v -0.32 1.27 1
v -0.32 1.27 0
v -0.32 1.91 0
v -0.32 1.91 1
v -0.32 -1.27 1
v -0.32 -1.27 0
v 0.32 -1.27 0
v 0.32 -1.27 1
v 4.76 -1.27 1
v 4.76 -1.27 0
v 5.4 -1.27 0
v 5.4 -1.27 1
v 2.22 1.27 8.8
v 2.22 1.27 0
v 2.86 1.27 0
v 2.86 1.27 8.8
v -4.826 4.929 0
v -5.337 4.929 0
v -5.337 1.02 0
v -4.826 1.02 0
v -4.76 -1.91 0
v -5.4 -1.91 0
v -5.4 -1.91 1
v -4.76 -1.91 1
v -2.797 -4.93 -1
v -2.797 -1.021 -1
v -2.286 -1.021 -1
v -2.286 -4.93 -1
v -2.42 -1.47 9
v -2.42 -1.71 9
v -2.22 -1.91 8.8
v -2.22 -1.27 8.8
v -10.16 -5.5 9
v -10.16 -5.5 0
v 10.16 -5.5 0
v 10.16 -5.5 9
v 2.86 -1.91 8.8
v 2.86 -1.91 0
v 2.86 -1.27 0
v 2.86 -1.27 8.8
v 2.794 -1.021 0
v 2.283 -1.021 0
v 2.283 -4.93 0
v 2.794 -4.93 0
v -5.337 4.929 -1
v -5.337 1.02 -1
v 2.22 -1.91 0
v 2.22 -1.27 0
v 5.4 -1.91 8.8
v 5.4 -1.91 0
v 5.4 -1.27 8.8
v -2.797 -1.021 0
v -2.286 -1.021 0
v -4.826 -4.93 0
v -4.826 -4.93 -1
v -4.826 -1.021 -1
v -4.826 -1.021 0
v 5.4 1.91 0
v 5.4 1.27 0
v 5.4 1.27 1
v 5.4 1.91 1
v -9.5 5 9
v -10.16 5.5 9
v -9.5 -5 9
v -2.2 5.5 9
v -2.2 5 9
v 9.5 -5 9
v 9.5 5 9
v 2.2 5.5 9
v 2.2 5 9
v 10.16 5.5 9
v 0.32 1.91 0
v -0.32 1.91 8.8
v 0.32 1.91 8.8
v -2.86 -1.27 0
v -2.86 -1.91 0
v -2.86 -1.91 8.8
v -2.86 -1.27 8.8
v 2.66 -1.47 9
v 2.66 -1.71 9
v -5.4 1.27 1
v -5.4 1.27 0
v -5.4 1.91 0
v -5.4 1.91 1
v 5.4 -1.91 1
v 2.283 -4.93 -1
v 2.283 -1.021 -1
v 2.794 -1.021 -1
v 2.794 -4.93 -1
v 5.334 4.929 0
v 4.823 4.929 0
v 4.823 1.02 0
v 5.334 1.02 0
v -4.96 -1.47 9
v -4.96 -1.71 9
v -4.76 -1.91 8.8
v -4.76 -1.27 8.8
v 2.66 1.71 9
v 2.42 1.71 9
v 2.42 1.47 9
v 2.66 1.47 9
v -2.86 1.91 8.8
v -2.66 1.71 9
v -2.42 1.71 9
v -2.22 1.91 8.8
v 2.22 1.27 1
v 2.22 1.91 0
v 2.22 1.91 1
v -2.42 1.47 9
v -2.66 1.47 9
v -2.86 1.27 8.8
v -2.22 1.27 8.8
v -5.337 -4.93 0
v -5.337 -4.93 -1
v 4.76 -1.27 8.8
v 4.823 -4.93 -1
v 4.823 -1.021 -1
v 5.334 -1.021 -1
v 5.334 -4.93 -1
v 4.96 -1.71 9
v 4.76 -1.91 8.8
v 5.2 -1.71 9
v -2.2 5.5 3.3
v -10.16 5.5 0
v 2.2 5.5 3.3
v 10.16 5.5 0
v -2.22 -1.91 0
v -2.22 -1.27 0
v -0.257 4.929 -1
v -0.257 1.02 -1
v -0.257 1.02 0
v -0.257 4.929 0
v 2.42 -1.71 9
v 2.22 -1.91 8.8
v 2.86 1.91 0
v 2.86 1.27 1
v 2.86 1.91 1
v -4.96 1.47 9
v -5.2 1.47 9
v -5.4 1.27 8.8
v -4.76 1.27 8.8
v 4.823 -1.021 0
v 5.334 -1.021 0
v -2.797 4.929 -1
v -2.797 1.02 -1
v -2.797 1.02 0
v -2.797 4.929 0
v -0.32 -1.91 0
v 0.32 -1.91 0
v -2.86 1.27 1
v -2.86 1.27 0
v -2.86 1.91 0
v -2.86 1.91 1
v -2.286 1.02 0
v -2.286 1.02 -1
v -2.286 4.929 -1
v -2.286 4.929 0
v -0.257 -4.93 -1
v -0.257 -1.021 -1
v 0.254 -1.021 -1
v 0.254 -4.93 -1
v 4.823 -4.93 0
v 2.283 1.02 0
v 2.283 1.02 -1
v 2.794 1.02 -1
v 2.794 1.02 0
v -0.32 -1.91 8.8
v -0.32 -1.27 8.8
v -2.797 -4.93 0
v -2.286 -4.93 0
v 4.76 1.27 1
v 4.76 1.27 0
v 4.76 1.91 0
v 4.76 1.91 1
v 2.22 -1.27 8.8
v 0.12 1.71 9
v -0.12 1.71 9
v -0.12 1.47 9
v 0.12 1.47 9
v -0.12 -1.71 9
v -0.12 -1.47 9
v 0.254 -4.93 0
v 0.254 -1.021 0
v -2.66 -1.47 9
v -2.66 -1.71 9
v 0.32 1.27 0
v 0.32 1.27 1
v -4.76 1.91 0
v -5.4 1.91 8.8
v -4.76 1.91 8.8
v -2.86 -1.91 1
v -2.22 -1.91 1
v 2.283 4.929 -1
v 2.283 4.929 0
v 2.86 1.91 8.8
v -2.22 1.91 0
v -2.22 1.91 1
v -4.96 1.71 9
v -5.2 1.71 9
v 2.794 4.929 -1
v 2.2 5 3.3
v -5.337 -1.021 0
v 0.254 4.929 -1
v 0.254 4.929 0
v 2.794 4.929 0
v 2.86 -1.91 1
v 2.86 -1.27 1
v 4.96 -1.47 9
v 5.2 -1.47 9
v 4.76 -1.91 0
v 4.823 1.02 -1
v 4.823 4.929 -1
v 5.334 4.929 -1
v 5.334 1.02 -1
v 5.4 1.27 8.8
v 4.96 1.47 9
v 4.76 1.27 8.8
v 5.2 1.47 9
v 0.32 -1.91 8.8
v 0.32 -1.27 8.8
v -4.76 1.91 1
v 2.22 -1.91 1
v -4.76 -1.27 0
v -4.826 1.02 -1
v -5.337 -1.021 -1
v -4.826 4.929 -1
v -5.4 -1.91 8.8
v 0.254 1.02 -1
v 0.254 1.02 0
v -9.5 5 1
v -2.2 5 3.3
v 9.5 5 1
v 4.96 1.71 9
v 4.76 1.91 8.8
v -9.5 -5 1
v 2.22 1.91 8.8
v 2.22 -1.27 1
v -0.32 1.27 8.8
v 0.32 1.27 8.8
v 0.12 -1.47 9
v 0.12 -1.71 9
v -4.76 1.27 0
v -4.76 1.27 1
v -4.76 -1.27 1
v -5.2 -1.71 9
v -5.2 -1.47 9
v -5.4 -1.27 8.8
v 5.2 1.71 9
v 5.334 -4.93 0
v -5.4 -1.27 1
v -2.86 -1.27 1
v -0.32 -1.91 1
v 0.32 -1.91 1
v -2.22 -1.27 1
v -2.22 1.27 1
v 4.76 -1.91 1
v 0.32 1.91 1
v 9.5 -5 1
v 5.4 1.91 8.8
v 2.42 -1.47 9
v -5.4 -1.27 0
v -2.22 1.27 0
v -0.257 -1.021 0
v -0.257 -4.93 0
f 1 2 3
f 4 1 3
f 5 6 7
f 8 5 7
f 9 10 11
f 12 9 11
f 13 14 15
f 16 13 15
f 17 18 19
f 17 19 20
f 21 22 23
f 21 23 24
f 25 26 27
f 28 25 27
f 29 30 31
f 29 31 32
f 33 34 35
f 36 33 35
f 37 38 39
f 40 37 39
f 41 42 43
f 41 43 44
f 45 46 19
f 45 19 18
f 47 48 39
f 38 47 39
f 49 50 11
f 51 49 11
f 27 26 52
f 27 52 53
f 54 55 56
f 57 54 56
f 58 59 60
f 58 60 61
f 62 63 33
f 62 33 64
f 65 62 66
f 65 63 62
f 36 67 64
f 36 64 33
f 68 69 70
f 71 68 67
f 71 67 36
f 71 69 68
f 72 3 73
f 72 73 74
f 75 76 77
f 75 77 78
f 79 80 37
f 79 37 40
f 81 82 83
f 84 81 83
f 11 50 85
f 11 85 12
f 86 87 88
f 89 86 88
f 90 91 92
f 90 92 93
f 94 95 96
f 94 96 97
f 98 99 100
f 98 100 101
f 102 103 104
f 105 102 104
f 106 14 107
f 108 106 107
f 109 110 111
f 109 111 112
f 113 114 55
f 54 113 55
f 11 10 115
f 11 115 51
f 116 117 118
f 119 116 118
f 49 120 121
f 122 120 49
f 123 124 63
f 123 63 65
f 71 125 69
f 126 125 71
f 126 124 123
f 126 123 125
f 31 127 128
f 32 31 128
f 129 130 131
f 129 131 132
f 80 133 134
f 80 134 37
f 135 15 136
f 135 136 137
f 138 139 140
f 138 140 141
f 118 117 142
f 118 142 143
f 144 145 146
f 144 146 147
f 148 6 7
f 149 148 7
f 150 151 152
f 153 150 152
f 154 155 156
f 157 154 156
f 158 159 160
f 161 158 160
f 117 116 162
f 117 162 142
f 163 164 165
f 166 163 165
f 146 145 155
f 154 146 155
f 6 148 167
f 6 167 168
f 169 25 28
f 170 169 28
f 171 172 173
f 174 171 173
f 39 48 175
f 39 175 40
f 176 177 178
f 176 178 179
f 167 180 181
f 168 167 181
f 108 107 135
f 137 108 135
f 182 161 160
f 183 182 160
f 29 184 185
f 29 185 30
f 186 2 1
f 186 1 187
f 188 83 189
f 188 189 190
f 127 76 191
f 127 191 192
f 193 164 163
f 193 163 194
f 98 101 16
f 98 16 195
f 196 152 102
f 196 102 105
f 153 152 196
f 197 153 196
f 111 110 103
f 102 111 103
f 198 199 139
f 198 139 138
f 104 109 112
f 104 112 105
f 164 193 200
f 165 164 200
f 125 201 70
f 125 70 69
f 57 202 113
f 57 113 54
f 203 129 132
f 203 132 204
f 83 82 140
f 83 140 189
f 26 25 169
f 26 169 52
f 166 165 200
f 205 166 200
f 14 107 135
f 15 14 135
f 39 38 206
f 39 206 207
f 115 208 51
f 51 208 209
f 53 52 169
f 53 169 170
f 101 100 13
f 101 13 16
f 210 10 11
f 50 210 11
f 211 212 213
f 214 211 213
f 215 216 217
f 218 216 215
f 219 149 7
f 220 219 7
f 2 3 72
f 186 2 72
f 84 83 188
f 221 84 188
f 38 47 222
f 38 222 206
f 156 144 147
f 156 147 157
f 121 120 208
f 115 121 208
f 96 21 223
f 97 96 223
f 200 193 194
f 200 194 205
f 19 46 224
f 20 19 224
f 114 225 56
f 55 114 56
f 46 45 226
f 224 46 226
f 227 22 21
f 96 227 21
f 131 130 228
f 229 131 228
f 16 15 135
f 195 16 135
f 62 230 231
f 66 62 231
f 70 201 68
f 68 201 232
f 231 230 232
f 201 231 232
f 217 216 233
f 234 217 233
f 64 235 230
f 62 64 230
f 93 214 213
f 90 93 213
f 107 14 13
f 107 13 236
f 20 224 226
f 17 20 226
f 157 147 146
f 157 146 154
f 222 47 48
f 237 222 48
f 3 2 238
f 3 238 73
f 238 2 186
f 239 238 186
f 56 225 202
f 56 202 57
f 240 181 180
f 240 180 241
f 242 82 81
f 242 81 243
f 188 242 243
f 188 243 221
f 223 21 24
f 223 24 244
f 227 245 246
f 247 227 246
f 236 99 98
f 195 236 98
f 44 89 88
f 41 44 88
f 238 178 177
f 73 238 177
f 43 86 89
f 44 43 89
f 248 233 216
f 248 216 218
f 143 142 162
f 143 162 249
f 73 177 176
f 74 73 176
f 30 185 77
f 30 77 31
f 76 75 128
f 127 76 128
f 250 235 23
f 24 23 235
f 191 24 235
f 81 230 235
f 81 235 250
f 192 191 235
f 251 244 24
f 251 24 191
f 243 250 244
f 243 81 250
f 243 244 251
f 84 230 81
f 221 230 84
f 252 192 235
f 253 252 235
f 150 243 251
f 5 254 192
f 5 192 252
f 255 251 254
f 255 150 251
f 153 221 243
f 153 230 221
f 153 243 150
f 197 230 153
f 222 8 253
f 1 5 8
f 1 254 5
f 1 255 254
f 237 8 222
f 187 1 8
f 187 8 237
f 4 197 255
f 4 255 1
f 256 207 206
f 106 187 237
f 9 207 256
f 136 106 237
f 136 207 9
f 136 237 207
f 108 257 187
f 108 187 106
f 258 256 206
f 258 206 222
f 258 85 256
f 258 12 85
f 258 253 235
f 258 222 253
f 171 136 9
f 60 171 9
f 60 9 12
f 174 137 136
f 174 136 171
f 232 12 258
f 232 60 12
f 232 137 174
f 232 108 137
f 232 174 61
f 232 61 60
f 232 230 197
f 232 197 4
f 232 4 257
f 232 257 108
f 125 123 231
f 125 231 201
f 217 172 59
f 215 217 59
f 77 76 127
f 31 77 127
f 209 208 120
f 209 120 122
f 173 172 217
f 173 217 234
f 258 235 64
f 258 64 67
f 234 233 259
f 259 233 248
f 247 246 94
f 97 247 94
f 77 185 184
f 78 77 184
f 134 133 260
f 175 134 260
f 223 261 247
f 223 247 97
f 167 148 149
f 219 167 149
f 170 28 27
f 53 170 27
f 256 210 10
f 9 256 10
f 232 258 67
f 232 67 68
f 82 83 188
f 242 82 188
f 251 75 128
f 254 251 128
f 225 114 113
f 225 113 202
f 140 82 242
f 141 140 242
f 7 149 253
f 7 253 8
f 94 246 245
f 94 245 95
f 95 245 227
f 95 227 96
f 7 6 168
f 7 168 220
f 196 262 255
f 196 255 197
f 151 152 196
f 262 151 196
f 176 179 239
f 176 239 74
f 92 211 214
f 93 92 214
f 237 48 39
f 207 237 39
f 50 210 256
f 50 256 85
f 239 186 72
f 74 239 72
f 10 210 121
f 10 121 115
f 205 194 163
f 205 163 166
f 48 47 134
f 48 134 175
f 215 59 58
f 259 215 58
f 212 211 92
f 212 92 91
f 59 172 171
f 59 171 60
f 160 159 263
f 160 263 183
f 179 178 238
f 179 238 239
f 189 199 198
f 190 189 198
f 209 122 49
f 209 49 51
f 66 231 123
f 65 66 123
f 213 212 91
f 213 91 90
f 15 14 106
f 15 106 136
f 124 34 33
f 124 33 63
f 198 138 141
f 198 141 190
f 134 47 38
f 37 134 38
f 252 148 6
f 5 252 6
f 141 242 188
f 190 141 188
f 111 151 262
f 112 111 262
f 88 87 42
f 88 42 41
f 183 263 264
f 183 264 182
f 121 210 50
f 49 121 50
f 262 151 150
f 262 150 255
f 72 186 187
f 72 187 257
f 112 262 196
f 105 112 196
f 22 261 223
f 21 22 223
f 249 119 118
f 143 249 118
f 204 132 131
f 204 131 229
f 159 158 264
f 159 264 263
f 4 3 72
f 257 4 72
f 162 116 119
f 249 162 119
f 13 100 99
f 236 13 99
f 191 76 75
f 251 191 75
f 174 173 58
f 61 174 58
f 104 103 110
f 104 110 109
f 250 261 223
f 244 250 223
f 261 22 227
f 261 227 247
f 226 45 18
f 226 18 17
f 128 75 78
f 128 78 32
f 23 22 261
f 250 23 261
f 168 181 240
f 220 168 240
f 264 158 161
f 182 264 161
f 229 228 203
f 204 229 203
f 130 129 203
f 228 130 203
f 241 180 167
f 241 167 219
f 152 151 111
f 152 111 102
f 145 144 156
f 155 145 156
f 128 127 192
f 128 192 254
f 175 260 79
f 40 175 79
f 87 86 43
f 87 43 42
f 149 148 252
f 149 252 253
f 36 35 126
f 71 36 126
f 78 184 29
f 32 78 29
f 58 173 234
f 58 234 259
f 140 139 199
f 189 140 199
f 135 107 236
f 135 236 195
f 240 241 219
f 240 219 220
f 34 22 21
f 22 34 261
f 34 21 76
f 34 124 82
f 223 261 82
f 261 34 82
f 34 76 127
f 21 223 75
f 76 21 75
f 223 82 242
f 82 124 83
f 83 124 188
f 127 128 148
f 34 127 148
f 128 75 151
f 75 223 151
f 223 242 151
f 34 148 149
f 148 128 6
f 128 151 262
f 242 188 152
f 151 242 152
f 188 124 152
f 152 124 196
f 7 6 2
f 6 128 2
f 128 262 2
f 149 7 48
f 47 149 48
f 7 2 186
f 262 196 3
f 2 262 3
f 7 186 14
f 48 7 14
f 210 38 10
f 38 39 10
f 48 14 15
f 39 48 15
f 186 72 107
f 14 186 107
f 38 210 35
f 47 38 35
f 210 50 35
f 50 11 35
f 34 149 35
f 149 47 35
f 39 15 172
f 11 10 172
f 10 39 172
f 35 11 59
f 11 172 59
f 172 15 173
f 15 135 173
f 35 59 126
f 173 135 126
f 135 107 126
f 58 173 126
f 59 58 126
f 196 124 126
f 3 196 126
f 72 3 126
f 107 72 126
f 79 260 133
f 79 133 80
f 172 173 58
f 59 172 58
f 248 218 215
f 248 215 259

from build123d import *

# Parameters (mm, degrees)
F0_W       = 20.32
F0_H       = 11
F0_W_2     = 19
F0_H_2     = 10
F1_DEPTH   = 9
F0_W_3     = 0.64
F0_H_3     = 0.64
F2_DEPTH   = 1
F3_DEPTH   = 9
F4_SIZE    = 0.2
F4_2_SIZE  = 0.2
F4_3_SIZE  = 0.2
F4_4_SIZE  = 0.2
F4_5_SIZE  = 0.2
F4_6_SIZE  = 0.2
F6_W       = 4.4
F6_H       = 0.5
F7_DEPTH   = 5.7
F9_W       = 0.5111949686
F9_H       = 3.9092235888
F10_DEPTH  = 1
F11_DEPTH  = 9
F12_SIZE   = 0.2
F12_2_SIZE = 0.2
F12_3_SIZE = 0.2
F12_4_SIZE = 0.2


# Not quite as in the source:
# - a feature names something its author has since deleted; it is built from what else it names


with BuildPart() as f1:
    # F0 (on Top) → F1 (new body)
    with BuildSketch(Plane.XY):
        Rectangle(F0_W, F0_H)
        Rectangle(F0_W_2, F0_H_2, mode=Mode.SUBTRACT)
    extrude(amount=F1_DEPTH)

    # F0 (on Top) → F2 (join)
    with BuildSketch(Plane.XY):
        Rectangle(F0_W_2, F0_H_2)
        with Locations((-5.08, -1.59)):
            Rectangle(F0_W_3, F0_H_3, mode=Mode.SUBTRACT)
        with Locations((-2.54, -1.59)):
            Rectangle(F0_W_3, F0_H_3, mode=Mode.SUBTRACT)
        with Locations((0, -1.59)):
            Rectangle(F0_W_3, F0_H_3, mode=Mode.SUBTRACT)
        with Locations((2.54, -1.59)):
            Rectangle(F0_W_3, F0_H_3, mode=Mode.SUBTRACT)
        with Locations((5.08, -1.59)):
            Rectangle(F0_W_3, F0_H_3, mode=Mode.SUBTRACT)
        with Locations((-5.08, 1.59)):
            Rectangle(F0_W_3, F0_H_3, mode=Mode.SUBTRACT)
        with Locations((-2.54, 1.59)):
            Rectangle(F0_W_3, F0_H_3, mode=Mode.SUBTRACT)
        with Locations((0, 1.59)):
            Rectangle(F0_W_3, F0_H_3, mode=Mode.SUBTRACT)
        with Locations((2.54, 1.59)):
            Rectangle(F0_W_3, F0_H_3, mode=Mode.SUBTRACT)
        with Locations((5.08, 1.59)):
            Rectangle(F0_W_3, F0_H_3, mode=Mode.SUBTRACT)
    extrude(amount=F2_DEPTH)

    # F6 (on offset) → F7 (cut)
    with BuildSketch(Plane.XY.offset(3.3)):
        with Locations((0, 5.25)):
            Rectangle(F6_W, F6_H)
    extrude(amount=F7_DEPTH, mode=Mode.SUBTRACT)


with BuildPart() as f3:
    # F0 (on Top) → F3 (new body)
    with BuildSketch(Plane.XY):
        with Locations((0, -1.59)):
            Rectangle(F0_W_3, F0_H_3)
    extrude(amount=F3_DEPTH)

    # F4#2
    f4_2_edges = [f3.edges().sort_by_distance(p)[0] for p in [
        (0, -1.27, 9),
        (-0.32, -1.59, 9),
        (0, -1.91, 9),
        (0.32, -1.59, 9),
    ]]
    chamfer(f4_2_edges, length=F4_2_SIZE)


with BuildPart() as f3b:
    # F0 (on Top) → F3, piece 2 (new body)
    with BuildSketch(Plane.XY):
        with Locations((0, 1.59)):
            Rectangle(F0_W_3, F0_H_3)
    extrude(amount=F3_DEPTH)

    # F4
    f4_edges = [f3b.edges().sort_by_distance(p)[0] for p in [
        (-0.32, 1.59, 9),
        (0, 1.27, 9),
        (0.32, 1.59, 9),
        (0, 1.91, 9),
    ]]
    chamfer(f4_edges, length=F4_SIZE)


with BuildPart() as f3c:
    # F0 (on Top) → F3, piece 3 (new body)
    with BuildSketch(Plane.XY):
        with Locations((2.54, 1.59)):
            Rectangle(F0_W_3, F0_H_3)
    extrude(amount=F3_DEPTH)

    # F4#4
    f4_4_edges = [f3c.edges().sort_by_distance(p)[0] for p in [
        (2.22, 1.59, 9),
        (2.54, 1.27, 9),
        (2.86, 1.59, 9),
        (2.54, 1.91, 9),
    ]]
    chamfer(f4_4_edges, length=F4_4_SIZE)


with BuildPart() as f3d:
    # F0 (on Top) → F3, piece 4 (new body)
    with BuildSketch(Plane.XY):
        with Locations((2.54, -1.59)):
            Rectangle(F0_W_3, F0_H_3)
    extrude(amount=F3_DEPTH)

    # F4#3
    f4_3_edges = [f3d.edges().sort_by_distance(p)[0] for p in [
        (2.22, -1.59, 9),
        (2.54, -1.91, 9),
        (2.86, -1.59, 9),
        (2.54, -1.27, 9),
    ]]
    chamfer(f4_3_edges, length=F4_3_SIZE)


with BuildPart() as f3e:
    # F0 (on Top) → F3, piece 5 (new body)
    with BuildSketch(Plane.XY):
        with Locations((5.08, 1.59)):
            Rectangle(F0_W_3, F0_H_3)
    extrude(amount=F3_DEPTH)

    # F4#5
    f4_5_edges = [f3e.edges().sort_by_distance(p)[0] for p in [
        (4.76, 1.59, 9),
        (5.08, 1.27, 9),
        (5.08, 1.91, 9),
        (5.4, 1.59, 9),
    ]]
    chamfer(f4_5_edges, length=F4_5_SIZE)


with BuildPart() as f3f:
    # F0 (on Top) → F3, piece 6 (new body)
    with BuildSketch(Plane.XY):
        with Locations((5.08, -1.59)):
            Rectangle(F0_W_3, F0_H_3)
    extrude(amount=F3_DEPTH)

    # F4#6
    f4_6_edges = [f3f.edges().sort_by_distance(p)[0] for p in [
        (5.08, -1.27, 9),
        (4.76, -1.59, 9),
        (5.08, -1.91, 9),
        (5.4, -1.59, 9),
    ]]
    chamfer(f4_6_edges, length=F4_6_SIZE)


with BuildPart() as f10:
    # F9 (on offset) → F10 (new body)
    with BuildSketch(Plane.XY.offset(-1)):
        with Locations((5.0781009255, -2.9758856997)):
            Rectangle(F9_W, F9_H)
    extrude(amount=F10_DEPTH)


with BuildPart() as f10b:
    # F9 (on offset) → F10, piece 2 (new body)
    with BuildSketch(Plane.XY.offset(-1)):
        with Locations((2.5381009255, -2.9758856997)):
            Rectangle(F9_W, F9_H)
    extrude(amount=F10_DEPTH)


with BuildPart() as f10c:
    # F9 (on offset) → F10, piece 3 (new body)
    with BuildSketch(Plane.XY.offset(-1)):
        with Locations((-0.0018990745, -2.9758856997)):
            Rectangle(F9_W, F9_H)
    extrude(amount=F10_DEPTH)


with BuildPart() as f10d:
    # F9 (on offset) → F10, piece 4 (new body)
    with BuildSketch(Plane.XY.offset(-1)):
        with Locations((-2.5418990745, -2.9758856997)):
            Rectangle(F9_W, F9_H)
    extrude(amount=F10_DEPTH)


with BuildPart() as f10e:
    # F9 (on offset) → F10, piece 5 (new body)
    with BuildSketch(Plane.XY.offset(-1)):
        with Locations((-5.0818990745, -2.9758856997)):
            Rectangle(F9_W, F9_H)
    extrude(amount=F10_DEPTH)


with BuildPart() as f10f:
    # F9 (on offset) → F10, piece 6 (new body)
    with BuildSketch(Plane.XY.offset(-1)):
        with Locations((-5.0818990745, 2.9747432311)):
            Rectangle(F9_W, F9_H)
    extrude(amount=F10_DEPTH)


with BuildPart() as f10g:
    # F9 (on offset) → F10, piece 7 (new body)
    with BuildSketch(Plane.XY.offset(-1)):
        with Locations((-2.5418990745, 2.9747432311)):
            Rectangle(F9_W, F9_H)
    extrude(amount=F10_DEPTH)


with BuildPart() as f10h:
    # F9 (on offset) → F10, piece 8 (new body)
    with BuildSketch(Plane.XY.offset(-1)):
        with Locations((-0.0018990745, 2.9747432311)):
            Rectangle(F9_W, F9_H)
    extrude(amount=F10_DEPTH)


with BuildPart() as f10i:
    # F9 (on offset) → F10, piece 9 (new body)
    with BuildSketch(Plane.XY.offset(-1)):
        with Locations((2.5381009255, 2.9747432311)):
            Rectangle(F9_W, F9_H)
    extrude(amount=F10_DEPTH)


with BuildPart() as f10j:
    # F9 (on offset) → F10, piece 10 (new body)
    with BuildSketch(Plane.XY.offset(-1)):
        with Locations((5.0781009255, 2.9747432311)):
            Rectangle(F9_W, F9_H)
    extrude(amount=F10_DEPTH)


with BuildPart() as f11:
    # F0 (on Top) → F11 (new body)
    with BuildSketch(Plane.XY):
        with Locations((-5.08, 1.59)):
            Rectangle(F0_W_3, F0_H_3)
    extrude(amount=F11_DEPTH)

    # F12
    f12_edges = [f11.edges().sort_by_distance(p)[0] for p in [
        (-5.4, 1.59, 9),
        (-5.08, 1.91, 9),
        (-5.08, 1.27, 9),
        (-4.76, 1.59, 9),
    ]]
    chamfer(f12_edges, length=F12_SIZE)


with BuildPart() as f11b:
    # F0 (on Top) → F11, piece 2 (new body)
    with BuildSketch(Plane.XY):
        with Locations((-2.54, 1.59)):
            Rectangle(F0_W_3, F0_H_3)
    extrude(amount=F11_DEPTH)

    # F12#2
    f12_2_edges = [f11b.edges().sort_by_distance(p)[0] for p in [
        (-2.86, 1.59, 9),
        (-2.54, 1.91, 9),
        (-2.22, 1.59, 9),
        (-2.54, 1.27, 9),
    ]]
    chamfer(f12_2_edges, length=F12_2_SIZE)


with BuildPart() as f11c:
    # F0 (on Top) → F11, piece 3 (new body)
    with BuildSketch(Plane.XY):
        with Locations((-2.54, -1.59)):
            Rectangle(F0_W_3, F0_H_3)
    extrude(amount=F11_DEPTH)

    # F12#4
    f12_4_edges = [f11c.edges().sort_by_distance(p)[0] for p in [
        (-2.86, -1.59, 9),
        (-2.54, -1.91, 9),
        (-2.22, -1.59, 9),
        (-2.54, -1.27, 9),
    ]]
    chamfer(f12_4_edges, length=F12_4_SIZE)


with BuildPart() as f11d:
    # F0 (on Top) → F11, piece 4 (new body)
    with BuildSketch(Plane.XY):
        with Locations((-5.08, -1.59)):
            Rectangle(F0_W_3, F0_H_3)
    extrude(amount=F11_DEPTH)

    # F12#3
    f12_3_edges = [f11d.edges().sort_by_distance(p)[0] for p in [
        (-5.4, -1.59, 9),
        (-5.08, -1.27, 9),
        (-4.76, -1.59, 9),
        (-5.08, -1.91, 9),
    ]]
    chamfer(f12_3_edges, length=F12_3_SIZE)


solid = Compound([f1.part, f3.part, f3b.part, f3c.part, f3d.part, f3e.part, f3f.part, f10.part, f10b.part, f10c.part, f10d.part, f10e.part, f10f.part, f10g.part, f10h.part, f10i.part, f10j.part, f11.part, f11b.part, f11c.part, f11d.part])
